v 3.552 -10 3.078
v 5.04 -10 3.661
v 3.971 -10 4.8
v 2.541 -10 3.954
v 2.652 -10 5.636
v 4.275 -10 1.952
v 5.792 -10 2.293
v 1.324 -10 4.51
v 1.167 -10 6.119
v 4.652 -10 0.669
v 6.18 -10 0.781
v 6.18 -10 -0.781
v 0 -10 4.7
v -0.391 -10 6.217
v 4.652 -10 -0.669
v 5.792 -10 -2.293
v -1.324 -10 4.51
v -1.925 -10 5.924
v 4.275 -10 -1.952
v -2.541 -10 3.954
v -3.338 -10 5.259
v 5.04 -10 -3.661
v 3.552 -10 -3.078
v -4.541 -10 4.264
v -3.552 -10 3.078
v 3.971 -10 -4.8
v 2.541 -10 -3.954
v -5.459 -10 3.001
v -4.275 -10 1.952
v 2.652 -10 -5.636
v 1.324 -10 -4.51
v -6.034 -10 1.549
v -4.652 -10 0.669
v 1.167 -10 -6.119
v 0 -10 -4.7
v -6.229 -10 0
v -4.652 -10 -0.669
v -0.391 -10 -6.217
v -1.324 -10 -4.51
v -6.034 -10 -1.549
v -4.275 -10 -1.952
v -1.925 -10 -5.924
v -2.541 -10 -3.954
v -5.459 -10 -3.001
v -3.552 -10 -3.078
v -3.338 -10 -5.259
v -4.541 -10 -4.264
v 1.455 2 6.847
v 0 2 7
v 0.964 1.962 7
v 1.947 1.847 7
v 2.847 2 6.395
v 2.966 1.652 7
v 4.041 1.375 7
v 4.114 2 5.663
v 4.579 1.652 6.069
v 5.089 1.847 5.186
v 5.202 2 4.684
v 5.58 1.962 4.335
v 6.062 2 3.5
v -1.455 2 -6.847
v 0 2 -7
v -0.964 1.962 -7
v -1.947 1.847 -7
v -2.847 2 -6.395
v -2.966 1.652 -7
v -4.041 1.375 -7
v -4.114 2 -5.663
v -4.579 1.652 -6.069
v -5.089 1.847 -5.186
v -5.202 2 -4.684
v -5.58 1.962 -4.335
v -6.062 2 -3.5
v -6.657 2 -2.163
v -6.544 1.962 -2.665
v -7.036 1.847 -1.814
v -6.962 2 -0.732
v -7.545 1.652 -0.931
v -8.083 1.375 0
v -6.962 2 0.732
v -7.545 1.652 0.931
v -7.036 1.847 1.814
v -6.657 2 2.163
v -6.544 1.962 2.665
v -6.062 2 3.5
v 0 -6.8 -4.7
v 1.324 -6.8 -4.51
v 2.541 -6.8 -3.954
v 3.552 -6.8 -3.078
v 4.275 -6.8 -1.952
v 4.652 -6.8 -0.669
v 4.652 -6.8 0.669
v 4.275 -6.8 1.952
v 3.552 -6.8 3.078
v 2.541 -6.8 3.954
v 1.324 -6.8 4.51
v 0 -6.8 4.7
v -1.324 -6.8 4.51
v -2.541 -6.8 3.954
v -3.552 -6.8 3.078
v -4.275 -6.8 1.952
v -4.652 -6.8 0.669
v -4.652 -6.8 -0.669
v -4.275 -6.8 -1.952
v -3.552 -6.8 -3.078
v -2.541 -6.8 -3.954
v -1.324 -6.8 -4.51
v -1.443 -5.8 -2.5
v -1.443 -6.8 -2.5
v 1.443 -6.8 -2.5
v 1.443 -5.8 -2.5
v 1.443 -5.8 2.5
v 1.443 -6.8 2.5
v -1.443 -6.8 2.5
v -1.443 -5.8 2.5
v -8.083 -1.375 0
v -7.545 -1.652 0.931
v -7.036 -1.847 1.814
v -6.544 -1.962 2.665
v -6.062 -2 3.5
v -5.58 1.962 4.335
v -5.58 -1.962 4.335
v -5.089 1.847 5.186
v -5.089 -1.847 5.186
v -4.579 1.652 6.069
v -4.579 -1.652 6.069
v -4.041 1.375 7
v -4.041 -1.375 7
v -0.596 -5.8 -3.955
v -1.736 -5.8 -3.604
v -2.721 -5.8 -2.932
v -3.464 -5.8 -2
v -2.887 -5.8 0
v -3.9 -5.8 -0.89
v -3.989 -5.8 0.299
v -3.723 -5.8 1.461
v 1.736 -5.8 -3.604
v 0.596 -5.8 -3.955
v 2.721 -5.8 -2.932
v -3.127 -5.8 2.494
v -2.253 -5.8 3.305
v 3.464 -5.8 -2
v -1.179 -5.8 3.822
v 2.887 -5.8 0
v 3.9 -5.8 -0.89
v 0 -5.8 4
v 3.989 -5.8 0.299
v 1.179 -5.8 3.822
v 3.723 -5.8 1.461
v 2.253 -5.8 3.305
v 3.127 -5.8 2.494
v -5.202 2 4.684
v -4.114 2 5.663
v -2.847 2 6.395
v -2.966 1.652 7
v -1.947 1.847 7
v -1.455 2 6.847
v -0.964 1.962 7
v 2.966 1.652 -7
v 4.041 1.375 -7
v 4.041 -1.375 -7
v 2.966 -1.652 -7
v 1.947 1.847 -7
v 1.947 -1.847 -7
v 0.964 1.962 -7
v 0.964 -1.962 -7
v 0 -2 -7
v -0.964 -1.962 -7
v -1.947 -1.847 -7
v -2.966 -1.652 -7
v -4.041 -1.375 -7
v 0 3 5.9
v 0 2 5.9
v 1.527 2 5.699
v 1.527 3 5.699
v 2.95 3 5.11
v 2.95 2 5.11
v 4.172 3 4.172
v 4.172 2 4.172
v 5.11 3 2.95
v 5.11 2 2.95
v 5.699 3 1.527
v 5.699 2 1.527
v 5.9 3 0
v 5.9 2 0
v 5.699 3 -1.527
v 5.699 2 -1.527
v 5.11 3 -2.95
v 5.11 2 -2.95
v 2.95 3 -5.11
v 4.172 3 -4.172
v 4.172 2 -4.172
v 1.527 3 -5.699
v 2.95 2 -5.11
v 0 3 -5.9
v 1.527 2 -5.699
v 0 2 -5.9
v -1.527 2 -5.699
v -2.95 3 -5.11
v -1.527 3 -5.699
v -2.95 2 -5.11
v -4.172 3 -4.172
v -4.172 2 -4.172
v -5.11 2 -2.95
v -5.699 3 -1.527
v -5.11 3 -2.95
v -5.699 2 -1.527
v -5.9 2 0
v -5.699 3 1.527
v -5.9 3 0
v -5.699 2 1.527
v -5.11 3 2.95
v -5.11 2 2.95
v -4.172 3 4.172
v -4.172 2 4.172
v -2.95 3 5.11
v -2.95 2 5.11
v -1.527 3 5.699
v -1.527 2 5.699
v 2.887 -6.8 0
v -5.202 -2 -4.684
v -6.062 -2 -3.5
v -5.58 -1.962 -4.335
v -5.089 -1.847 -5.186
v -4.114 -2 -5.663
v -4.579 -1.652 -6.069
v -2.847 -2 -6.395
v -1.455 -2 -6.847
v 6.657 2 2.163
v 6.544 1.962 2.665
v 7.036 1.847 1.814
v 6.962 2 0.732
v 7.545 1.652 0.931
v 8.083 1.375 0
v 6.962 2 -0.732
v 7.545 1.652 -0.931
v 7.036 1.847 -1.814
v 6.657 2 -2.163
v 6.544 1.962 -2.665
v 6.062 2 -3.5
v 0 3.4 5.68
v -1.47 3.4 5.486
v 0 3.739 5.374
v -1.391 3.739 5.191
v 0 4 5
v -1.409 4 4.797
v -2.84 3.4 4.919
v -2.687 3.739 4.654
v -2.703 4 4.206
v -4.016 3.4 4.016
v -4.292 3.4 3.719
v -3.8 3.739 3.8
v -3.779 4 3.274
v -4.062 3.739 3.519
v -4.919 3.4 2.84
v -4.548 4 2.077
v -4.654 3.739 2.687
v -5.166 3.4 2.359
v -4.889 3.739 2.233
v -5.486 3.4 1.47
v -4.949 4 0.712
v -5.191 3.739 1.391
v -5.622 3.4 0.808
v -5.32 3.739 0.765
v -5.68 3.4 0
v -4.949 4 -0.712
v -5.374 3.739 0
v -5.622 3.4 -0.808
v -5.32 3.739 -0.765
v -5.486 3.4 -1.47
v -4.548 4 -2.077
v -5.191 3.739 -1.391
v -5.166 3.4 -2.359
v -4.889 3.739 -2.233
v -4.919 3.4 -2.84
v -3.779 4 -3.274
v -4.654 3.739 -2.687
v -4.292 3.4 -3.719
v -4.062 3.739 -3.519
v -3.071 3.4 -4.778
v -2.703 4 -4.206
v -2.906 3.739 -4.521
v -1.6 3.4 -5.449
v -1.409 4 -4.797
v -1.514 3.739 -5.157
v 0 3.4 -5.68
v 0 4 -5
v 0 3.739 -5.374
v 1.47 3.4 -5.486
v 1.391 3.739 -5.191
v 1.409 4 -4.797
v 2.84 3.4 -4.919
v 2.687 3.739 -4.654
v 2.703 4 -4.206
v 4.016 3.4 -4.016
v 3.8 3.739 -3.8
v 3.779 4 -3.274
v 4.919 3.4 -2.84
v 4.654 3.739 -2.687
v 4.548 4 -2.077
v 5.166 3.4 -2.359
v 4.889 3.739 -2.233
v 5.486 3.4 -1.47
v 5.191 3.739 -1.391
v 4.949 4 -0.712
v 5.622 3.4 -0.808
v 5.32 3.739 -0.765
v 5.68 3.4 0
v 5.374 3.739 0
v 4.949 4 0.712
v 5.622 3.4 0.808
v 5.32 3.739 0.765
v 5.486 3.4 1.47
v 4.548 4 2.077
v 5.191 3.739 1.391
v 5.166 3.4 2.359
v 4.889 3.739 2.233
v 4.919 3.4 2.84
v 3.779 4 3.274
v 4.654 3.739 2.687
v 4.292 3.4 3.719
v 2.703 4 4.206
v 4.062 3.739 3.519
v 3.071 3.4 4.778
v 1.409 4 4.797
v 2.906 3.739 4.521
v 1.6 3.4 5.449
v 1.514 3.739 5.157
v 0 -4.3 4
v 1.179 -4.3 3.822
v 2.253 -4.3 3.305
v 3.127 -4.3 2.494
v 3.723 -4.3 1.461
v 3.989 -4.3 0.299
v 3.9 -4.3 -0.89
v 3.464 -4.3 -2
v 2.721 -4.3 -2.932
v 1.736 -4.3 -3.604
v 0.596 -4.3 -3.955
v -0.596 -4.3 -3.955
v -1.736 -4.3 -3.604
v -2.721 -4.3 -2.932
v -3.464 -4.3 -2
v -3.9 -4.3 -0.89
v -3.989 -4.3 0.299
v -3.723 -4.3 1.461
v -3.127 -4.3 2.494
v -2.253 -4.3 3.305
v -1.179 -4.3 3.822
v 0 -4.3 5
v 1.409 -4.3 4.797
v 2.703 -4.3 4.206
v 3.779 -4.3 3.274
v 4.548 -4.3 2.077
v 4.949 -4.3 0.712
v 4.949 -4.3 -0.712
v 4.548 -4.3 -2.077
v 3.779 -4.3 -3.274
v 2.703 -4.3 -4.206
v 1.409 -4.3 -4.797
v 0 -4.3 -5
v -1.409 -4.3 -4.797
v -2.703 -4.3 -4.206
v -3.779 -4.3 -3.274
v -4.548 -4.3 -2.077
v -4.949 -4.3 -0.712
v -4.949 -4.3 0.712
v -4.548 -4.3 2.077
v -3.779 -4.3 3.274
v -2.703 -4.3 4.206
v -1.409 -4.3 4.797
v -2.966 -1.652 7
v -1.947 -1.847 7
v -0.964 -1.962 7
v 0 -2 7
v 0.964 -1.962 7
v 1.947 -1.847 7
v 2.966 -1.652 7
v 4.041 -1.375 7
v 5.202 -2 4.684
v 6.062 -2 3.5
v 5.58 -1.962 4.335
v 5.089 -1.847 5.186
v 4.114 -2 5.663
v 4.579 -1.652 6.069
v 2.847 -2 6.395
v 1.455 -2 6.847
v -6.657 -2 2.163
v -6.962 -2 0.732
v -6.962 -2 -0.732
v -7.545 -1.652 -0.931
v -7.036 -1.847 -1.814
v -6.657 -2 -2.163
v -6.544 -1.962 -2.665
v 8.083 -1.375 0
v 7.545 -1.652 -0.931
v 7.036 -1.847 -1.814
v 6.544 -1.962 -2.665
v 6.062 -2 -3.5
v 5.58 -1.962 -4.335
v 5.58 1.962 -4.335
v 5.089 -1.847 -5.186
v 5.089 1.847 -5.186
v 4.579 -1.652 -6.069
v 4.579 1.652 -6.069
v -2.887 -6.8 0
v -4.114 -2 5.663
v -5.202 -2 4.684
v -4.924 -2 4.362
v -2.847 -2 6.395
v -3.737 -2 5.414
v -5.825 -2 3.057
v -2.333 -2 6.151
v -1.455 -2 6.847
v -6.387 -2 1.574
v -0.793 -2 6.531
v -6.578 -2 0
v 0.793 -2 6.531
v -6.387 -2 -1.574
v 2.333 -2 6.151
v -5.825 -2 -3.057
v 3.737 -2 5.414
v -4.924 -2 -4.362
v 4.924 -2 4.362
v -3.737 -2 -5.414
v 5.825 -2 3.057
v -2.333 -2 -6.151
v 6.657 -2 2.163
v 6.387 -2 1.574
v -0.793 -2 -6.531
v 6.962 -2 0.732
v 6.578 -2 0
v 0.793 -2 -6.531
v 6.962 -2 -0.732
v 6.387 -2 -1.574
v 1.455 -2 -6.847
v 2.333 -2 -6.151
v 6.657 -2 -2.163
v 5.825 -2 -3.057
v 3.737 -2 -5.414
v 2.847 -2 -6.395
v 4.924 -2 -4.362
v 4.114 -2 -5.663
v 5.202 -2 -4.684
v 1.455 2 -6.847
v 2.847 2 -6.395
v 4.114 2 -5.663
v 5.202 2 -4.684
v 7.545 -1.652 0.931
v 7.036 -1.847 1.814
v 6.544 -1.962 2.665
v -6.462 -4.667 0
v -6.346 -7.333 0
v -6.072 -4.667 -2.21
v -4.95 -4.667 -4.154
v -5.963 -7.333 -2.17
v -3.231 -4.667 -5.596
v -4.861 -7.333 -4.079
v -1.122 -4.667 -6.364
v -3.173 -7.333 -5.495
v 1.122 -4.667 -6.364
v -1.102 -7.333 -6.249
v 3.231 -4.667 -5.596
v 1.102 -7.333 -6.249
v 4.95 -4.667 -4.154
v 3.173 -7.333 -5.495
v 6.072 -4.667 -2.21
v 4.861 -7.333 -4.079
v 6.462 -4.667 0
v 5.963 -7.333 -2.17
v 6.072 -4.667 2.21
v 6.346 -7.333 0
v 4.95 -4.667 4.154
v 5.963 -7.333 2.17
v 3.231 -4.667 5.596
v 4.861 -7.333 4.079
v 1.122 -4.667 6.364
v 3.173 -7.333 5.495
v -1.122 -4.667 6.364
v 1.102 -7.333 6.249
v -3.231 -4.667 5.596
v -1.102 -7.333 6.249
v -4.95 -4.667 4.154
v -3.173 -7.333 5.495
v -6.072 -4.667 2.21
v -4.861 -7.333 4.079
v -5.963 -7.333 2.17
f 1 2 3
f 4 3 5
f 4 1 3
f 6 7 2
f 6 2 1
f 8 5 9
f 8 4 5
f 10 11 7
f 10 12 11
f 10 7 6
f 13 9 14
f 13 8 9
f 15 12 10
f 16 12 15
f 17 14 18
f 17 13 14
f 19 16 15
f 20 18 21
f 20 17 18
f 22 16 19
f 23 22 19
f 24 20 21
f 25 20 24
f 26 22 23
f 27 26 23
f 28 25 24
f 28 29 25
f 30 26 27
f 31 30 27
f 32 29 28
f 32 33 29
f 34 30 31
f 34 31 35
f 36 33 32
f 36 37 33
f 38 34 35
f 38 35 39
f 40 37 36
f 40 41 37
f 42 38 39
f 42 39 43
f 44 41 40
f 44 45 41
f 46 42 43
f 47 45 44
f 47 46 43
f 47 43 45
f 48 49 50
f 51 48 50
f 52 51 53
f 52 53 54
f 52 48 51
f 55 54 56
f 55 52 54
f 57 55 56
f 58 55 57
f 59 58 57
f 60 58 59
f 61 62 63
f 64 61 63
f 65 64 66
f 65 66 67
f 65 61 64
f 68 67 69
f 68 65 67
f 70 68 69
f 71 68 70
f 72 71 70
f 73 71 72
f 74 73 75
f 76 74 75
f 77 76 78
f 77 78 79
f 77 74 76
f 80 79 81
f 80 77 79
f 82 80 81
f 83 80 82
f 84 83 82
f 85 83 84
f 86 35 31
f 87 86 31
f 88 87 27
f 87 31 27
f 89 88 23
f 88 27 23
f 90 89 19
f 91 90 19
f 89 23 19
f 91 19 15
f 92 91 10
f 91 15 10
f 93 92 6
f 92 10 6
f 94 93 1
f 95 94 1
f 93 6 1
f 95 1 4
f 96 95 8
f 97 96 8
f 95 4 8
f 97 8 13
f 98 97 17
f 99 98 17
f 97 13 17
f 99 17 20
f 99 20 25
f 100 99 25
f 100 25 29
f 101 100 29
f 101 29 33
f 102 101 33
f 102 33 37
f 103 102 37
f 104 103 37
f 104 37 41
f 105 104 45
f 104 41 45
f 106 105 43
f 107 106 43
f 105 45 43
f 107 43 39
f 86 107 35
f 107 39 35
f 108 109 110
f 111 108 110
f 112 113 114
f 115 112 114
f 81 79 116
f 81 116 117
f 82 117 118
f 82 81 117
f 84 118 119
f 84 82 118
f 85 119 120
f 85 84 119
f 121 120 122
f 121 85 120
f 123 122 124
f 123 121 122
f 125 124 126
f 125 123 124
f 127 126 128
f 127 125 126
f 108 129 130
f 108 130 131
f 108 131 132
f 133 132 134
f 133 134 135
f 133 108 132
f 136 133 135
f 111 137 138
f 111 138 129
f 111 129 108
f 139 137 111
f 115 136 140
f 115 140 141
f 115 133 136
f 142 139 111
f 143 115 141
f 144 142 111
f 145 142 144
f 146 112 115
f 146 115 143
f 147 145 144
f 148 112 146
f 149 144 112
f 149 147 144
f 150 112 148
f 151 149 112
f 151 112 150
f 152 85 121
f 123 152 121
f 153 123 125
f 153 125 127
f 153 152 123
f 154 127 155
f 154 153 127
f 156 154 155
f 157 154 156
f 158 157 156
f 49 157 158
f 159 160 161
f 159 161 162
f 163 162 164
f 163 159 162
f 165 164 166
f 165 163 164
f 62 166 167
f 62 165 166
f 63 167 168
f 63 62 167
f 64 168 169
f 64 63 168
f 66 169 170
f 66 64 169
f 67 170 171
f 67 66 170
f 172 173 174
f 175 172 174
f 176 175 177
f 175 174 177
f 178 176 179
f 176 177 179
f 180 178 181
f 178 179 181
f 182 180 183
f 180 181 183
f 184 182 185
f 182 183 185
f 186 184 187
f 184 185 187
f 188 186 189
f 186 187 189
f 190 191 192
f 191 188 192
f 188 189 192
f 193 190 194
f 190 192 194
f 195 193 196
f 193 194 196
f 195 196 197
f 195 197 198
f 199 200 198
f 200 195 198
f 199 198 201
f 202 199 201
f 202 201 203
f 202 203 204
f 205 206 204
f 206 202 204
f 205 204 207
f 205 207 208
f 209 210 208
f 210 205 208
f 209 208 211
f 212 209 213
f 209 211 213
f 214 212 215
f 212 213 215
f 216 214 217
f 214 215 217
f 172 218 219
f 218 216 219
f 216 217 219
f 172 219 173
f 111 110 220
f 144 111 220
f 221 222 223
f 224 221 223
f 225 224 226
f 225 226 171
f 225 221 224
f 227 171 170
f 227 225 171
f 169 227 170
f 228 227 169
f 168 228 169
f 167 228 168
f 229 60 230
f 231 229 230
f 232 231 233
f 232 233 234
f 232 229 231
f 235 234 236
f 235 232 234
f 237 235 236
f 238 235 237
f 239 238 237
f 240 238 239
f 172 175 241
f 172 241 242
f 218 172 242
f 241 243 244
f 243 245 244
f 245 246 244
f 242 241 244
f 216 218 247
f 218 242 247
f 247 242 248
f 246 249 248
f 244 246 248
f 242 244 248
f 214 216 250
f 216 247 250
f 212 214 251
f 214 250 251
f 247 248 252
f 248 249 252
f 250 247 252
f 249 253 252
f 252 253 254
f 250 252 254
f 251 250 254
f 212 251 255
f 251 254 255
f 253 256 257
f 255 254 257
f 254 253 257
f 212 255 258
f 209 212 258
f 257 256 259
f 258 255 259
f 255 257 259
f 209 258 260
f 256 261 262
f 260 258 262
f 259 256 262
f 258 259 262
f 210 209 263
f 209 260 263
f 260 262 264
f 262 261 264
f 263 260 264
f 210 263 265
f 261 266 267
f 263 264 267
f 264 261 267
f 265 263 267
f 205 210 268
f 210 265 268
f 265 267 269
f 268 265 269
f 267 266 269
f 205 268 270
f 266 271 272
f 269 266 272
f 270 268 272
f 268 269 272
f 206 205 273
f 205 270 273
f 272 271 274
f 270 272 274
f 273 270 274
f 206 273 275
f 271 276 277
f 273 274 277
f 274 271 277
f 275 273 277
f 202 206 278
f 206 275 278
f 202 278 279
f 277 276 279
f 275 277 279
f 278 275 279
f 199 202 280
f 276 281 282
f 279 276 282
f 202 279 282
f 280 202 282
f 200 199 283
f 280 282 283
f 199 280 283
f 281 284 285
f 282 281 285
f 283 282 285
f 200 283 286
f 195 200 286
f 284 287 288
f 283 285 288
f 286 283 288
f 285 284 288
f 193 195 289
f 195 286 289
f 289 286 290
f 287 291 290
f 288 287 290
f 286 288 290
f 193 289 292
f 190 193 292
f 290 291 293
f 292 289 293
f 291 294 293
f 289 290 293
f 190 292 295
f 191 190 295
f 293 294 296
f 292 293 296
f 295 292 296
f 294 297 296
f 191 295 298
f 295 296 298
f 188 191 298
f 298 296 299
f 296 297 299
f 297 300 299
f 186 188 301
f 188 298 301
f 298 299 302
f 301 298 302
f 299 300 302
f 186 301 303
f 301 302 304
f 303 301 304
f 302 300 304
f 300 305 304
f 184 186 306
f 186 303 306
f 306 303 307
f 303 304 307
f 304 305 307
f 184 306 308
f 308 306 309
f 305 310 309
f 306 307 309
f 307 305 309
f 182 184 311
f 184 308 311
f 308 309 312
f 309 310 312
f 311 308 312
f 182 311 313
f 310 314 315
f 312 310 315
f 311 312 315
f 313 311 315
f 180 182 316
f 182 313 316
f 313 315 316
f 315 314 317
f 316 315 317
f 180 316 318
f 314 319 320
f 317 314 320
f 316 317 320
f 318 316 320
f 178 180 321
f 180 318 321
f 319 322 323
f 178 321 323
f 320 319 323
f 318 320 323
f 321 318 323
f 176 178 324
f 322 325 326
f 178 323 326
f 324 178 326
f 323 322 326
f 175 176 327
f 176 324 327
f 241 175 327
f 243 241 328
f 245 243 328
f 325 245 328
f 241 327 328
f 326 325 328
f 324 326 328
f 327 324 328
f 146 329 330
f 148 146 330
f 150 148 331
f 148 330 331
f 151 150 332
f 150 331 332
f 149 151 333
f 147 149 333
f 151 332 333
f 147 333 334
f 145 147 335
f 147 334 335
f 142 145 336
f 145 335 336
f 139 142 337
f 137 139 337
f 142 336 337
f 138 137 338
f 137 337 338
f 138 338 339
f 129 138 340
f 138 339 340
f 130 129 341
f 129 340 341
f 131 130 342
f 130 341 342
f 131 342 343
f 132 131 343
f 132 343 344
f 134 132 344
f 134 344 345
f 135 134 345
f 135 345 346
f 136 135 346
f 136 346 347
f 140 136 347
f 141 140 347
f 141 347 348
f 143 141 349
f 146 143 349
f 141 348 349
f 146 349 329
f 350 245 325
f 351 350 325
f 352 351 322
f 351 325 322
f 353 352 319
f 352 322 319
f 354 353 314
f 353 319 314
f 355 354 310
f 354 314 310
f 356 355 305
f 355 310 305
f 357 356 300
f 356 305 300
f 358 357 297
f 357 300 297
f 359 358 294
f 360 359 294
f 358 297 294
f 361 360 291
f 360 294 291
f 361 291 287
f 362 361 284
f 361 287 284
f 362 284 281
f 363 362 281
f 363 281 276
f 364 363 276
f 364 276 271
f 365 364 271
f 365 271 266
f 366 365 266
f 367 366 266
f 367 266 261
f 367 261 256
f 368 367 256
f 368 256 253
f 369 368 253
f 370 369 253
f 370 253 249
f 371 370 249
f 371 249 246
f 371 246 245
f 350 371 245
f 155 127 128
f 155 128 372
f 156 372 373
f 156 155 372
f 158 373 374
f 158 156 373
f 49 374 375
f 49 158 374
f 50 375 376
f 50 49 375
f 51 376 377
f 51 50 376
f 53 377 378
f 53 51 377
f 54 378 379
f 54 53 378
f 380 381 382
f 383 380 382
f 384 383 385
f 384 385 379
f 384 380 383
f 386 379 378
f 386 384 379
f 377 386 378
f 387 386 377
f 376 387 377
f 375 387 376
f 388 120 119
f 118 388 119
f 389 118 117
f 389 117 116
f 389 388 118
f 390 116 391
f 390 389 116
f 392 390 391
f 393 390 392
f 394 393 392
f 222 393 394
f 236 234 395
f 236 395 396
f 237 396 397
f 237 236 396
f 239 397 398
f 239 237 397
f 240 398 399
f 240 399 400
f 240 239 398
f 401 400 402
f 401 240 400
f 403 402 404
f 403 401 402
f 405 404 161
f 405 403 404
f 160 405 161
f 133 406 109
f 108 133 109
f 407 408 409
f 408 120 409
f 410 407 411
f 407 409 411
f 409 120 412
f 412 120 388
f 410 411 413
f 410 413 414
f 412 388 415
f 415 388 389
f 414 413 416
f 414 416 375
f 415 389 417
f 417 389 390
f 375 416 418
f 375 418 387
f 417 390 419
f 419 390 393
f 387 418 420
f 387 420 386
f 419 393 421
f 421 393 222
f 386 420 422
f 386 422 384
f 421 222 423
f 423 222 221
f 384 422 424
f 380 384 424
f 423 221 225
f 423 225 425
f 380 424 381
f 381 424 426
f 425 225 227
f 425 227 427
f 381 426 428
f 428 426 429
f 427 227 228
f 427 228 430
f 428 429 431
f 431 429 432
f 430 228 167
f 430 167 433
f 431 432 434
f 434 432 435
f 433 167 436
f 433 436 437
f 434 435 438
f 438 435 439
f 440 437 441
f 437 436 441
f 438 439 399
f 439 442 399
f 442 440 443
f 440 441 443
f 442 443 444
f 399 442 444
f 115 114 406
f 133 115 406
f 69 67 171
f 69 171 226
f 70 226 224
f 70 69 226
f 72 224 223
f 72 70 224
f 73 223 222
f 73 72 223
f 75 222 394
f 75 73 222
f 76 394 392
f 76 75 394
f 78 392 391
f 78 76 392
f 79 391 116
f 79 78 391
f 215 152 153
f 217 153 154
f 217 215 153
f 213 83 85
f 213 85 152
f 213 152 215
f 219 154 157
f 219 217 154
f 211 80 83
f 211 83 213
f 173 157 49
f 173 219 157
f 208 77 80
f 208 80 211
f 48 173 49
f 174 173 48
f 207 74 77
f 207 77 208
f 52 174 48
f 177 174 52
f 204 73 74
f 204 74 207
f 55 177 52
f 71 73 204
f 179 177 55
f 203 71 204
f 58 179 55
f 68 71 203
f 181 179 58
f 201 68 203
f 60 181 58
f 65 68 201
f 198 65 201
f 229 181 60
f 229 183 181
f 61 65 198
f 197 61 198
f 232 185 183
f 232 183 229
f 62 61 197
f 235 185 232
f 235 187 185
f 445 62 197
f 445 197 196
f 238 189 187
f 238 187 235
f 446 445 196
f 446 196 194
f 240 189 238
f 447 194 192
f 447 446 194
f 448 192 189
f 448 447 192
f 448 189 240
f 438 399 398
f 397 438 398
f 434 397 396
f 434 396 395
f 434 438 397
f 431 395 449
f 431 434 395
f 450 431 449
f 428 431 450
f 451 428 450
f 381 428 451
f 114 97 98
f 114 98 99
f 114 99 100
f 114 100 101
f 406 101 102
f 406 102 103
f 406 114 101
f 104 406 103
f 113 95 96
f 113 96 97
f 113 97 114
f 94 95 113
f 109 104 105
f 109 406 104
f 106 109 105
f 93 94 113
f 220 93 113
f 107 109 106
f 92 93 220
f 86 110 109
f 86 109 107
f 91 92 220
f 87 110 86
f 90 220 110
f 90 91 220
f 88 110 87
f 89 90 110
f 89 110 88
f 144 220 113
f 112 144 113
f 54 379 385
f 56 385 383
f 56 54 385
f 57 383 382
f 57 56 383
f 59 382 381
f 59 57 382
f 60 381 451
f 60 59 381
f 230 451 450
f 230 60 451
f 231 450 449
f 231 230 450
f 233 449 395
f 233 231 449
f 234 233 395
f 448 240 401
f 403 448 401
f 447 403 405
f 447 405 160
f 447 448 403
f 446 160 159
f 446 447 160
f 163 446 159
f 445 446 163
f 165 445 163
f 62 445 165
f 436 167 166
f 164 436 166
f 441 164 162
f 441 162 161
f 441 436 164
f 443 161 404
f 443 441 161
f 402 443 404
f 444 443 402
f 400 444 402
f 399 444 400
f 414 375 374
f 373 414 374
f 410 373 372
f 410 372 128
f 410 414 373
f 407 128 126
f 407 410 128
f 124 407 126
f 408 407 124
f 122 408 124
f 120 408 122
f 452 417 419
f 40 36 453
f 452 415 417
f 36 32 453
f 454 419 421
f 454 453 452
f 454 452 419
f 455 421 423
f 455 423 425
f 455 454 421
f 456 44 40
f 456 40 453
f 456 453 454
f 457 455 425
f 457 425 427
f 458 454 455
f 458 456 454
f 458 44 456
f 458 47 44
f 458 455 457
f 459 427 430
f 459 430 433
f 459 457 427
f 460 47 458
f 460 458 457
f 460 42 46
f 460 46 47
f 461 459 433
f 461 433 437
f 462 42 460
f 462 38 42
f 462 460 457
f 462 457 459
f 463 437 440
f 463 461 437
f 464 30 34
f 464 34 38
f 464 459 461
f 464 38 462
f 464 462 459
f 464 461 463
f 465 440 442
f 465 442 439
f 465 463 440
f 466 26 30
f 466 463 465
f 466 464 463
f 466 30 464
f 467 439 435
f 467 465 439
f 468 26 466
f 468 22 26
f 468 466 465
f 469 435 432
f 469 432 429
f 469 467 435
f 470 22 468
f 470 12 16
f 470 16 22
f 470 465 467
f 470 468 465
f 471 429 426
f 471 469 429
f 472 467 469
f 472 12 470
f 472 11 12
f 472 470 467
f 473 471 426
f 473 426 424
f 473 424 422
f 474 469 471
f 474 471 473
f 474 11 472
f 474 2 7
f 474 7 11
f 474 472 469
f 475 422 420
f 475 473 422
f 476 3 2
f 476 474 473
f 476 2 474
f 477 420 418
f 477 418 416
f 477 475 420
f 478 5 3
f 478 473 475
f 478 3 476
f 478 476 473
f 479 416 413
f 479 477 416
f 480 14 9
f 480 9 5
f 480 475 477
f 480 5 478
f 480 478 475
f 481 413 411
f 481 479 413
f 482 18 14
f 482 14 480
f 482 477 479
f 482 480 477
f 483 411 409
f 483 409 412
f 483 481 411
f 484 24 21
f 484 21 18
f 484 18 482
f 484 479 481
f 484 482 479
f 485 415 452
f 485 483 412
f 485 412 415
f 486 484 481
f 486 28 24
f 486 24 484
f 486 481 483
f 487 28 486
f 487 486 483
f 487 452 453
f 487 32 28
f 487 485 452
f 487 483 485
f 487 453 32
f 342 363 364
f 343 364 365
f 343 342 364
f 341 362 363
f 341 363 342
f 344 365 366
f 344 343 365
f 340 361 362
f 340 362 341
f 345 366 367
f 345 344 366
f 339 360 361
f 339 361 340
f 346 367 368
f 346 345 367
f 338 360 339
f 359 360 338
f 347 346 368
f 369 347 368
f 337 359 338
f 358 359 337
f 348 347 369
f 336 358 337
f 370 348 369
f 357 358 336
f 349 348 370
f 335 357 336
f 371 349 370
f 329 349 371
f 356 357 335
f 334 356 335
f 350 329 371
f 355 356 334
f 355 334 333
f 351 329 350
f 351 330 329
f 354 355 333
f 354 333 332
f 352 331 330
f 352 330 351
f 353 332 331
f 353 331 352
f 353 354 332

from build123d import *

# Parameters (mm, degrees)
HEXBASE_DEPTH             = 2
TUBECLAMPINGHEADS_R       = 5.9
TUBECLAMPINGHEAD_DEPTH    = 2
FASTENINGHEADS_R          = 6.5785
FASTENINGHEAD_DEPTH       = 8
FASTENINGHEAD_TAPER       = 2.5
BOREFASTENINGHEADS_R      = 4.7
BOREFASTENINGHEAD_DEPTH   = 3.2
HEXKEY_DEPTH              = 16.197806859
BORETUBEACCESSS_R         = 5
BORETUBEACCESS_DEPTH      = 9.8
ORINGSEAT_START           = 1.5
ORINGSEATS_R              = 5
ORINGSEATS_R_2            = 4
ORINGSEAT_DEPTH           = 1.5
CHAMFERHEXBASES_OUTSIDE_W = 82.42
CHAMFERHEXBASES_OUTSIDE_H = 80.254
CHAMFERHEXBASES_OUTSIDE_R = 7
CHAMFERHEXBASE_DEPTH      = 17.072751343
CHAMFERHEXBASE_DRAFT      = -60
CHB_VM_COPY_1_SKETCH_W    = 82.42
CHB_VM_COPY_1_SKETCH_H    = 80.254
CHB_VM_COPY_1_SKETCH_R    = 7
CHB_VM_COPY_1_DEPTH       = 17.072751343
CHB_VM_COPY_1_DRAFT       = -60


with BuildPart() as part:
    # HexBaseS → HexBase (new, symmetric)
    with BuildSketch(Plane(origin=(0, 0, 0), x_dir=(1, 0, 0), z_dir=(0, 1, 0))):
        Polygon((8.082903769, 0), (4.041451884, 7), (-4.041451884, 7), (-8.082903769, 0), (-4.041451884, -7), (4.041451884, -7), align=None)
    extrude(amount=HEXBASE_DEPTH, both=True)

    # TubeClampingHeadS → TubeClampingHead (add)
    with BuildSketch(Plane(origin=(0, 2, 0), x_dir=(1, 0, 0), z_dir=(0, 1, 0))):
        with Locations(Location((0, 0, 0), (0, 0, 270))):
            Circle(TUBECLAMPINGHEADS_R)
    extrude(amount=TUBECLAMPINGHEAD_DEPTH)

    # FasteningHeadS → FasteningHead (add)
    with BuildSketch(Plane(origin=(0, -2, 0), x_dir=(-1, 0, 0), z_dir=(0, -1, 0))):
        Circle(FASTENINGHEADS_R)
    extrude(amount=FASTENINGHEAD_DEPTH, taper=FASTENINGHEAD_TAPER)

    # BoreFasteningHeadS → BoreFasteningHead (cut)
    with BuildSketch(Plane.XZ.offset(10)):
        with Locations(Location((0, 0, 0), (0, 0, 270))):
            Circle(BOREFASTENINGHEADS_R)
    extrude(amount=-BOREFASTENINGHEAD_DEPTH, mode=Mode.SUBTRACT)

    # HexKeyS → HexKey (cut, through all)
    with BuildSketch(Plane(origin=(0, -6.8, 0), x_dir=(-1, 0, 0), z_dir=(0, -1, 0))):
        Polygon((-1.443375673, 2.5), (-2.886751346, 0), (-1.443375673, -2.5), (1.443375673, -2.5), (2.886751346, 0), (1.443375673, 2.5), align=None)
    extrude(amount=-HEXKEY_DEPTH, mode=Mode.SUBTRACT)

    # BoreTubeAccessS → BoreTubeAccess (cut)
    with BuildSketch(Plane(origin=(0, 4, 0), x_dir=(1, 0, 0), z_dir=(0, 1, 0))):
        with Locations(Location((0, 0, 0), (0, 0, 270))):
            Circle(BORETUBEACCESSS_R)
    extrude(amount=-BORETUBEACCESS_DEPTH, mode=Mode.SUBTRACT)

    # ClampingFeatureS → ClampingFeature (revolve, cut)
    with BuildSketch(Plane.XY, mode=Mode.PRIVATE) as clampingfeature_sk:
        with BuildLine():
            Line((5, 4), (5.9, 4))
            Line((5.9, 4), (5.9, 3))
            ThreePointArc((5.9, 3), (5.536608024, 3.577947222), (5, 4))
        make_face()
    revolve(clampingfeature_sk.sketch.rotate(Axis((0, 4, 0), (0, -1, 0)), 90), axis=Axis((0, 4, 0), (0, -1, 0)), mode=Mode.SUBTRACT)

    # ORingSeatS → ORingSeat (add)
    with BuildSketch(Plane(origin=(0, -5.8, 0), x_dir=(1, 0, 0), z_dir=(0, 1, 0)).offset(ORINGSEAT_START)):
        with Locations(Location((0, 0, 0), (0, 0, 270))):
            Circle(ORINGSEATS_R)
        with Locations(Location((0, 0, 0), (0, 0, 270))):
            Circle(ORINGSEATS_R_2, mode=Mode.SUBTRACT)
    extrude(amount=-ORINGSEAT_DEPTH)


with BuildPart() as chamferhexbase_tool:
    # ChamferHexBaseS outside → ChamferHexBase (with draft: the straight prism first)
    with BuildSketch(Plane(origin=(0, 2, 0), x_dir=(1, 0, 0), z_dir=(0, 1, 0))):
        Rectangle(CHAMFERHEXBASES_OUTSIDE_W, CHAMFERHEXBASES_OUTSIDE_H)
        Circle(CHAMFERHEXBASES_OUTSIDE_R, mode=Mode.SUBTRACT)
    extrude(amount=-CHAMFERHEXBASE_DEPTH)
    # ChamferHexBase: the draft: its side faces are tilted about the plane it starts from
    chamferhexbase_sides = [chamferhexbase_tool.faces().sort_by_distance(p)[0] for p in [
        (0, -6.536375671, 40.127),
        (41.21, -6.536375671, 0),
        (0, -6.536375671, -40.127),
        (-41.21, -6.536375671, 0),
        (-7, -6.536375671, 0),
    ]]
    draft(chamferhexbase_sides, Plane(origin=(0, 2, 0), x_dir=(1, 0, 0), z_dir=(0, 1, 0)), CHAMFERHEXBASE_DRAFT)


with BuildPart() as part_1:
    add(part.part)

    # ChamferHexBase: cut by chamferhexbase_tool
    add(chamferhexbase_tool.part, mode=Mode.SUBTRACT)


with BuildPart() as chb_vm_copy_1_tool:
    # CHB VM copy 1 sketch → CHB VM copy 1 (with draft: the straight prism first)
    with BuildSketch(Plane.XZ.offset(2)):
        Rectangle(CHB_VM_COPY_1_SKETCH_W, CHB_VM_COPY_1_SKETCH_H)
        Circle(CHB_VM_COPY_1_SKETCH_R, mode=Mode.SUBTRACT)
    extrude(amount=-CHB_VM_COPY_1_DEPTH)
    # CHB VM copy 1: the draft: its side faces are tilted about the plane it starts from
    chb_vm_copy_1_sides = [chb_vm_copy_1_tool.faces().sort_by_distance(p)[0] for p in [
        (0, 6.536375671, 40.127),
        (41.21, 6.536375671, 0),
        (0, 6.536375671, -40.127),
        (-41.21, 6.536375671, 0),
        (-7, 6.536375671, 0),
    ]]
    draft(chb_vm_copy_1_sides, Plane.XZ.offset(2), CHB_VM_COPY_1_DRAFT)


with BuildPart() as part_2:
    add(part_1.part)

    # CHB VM copy 1: cut by chb_vm_copy_1_tool
    add(chb_vm_copy_1_tool.part, mode=Mode.SUBTRACT)


solid = part_2.part
